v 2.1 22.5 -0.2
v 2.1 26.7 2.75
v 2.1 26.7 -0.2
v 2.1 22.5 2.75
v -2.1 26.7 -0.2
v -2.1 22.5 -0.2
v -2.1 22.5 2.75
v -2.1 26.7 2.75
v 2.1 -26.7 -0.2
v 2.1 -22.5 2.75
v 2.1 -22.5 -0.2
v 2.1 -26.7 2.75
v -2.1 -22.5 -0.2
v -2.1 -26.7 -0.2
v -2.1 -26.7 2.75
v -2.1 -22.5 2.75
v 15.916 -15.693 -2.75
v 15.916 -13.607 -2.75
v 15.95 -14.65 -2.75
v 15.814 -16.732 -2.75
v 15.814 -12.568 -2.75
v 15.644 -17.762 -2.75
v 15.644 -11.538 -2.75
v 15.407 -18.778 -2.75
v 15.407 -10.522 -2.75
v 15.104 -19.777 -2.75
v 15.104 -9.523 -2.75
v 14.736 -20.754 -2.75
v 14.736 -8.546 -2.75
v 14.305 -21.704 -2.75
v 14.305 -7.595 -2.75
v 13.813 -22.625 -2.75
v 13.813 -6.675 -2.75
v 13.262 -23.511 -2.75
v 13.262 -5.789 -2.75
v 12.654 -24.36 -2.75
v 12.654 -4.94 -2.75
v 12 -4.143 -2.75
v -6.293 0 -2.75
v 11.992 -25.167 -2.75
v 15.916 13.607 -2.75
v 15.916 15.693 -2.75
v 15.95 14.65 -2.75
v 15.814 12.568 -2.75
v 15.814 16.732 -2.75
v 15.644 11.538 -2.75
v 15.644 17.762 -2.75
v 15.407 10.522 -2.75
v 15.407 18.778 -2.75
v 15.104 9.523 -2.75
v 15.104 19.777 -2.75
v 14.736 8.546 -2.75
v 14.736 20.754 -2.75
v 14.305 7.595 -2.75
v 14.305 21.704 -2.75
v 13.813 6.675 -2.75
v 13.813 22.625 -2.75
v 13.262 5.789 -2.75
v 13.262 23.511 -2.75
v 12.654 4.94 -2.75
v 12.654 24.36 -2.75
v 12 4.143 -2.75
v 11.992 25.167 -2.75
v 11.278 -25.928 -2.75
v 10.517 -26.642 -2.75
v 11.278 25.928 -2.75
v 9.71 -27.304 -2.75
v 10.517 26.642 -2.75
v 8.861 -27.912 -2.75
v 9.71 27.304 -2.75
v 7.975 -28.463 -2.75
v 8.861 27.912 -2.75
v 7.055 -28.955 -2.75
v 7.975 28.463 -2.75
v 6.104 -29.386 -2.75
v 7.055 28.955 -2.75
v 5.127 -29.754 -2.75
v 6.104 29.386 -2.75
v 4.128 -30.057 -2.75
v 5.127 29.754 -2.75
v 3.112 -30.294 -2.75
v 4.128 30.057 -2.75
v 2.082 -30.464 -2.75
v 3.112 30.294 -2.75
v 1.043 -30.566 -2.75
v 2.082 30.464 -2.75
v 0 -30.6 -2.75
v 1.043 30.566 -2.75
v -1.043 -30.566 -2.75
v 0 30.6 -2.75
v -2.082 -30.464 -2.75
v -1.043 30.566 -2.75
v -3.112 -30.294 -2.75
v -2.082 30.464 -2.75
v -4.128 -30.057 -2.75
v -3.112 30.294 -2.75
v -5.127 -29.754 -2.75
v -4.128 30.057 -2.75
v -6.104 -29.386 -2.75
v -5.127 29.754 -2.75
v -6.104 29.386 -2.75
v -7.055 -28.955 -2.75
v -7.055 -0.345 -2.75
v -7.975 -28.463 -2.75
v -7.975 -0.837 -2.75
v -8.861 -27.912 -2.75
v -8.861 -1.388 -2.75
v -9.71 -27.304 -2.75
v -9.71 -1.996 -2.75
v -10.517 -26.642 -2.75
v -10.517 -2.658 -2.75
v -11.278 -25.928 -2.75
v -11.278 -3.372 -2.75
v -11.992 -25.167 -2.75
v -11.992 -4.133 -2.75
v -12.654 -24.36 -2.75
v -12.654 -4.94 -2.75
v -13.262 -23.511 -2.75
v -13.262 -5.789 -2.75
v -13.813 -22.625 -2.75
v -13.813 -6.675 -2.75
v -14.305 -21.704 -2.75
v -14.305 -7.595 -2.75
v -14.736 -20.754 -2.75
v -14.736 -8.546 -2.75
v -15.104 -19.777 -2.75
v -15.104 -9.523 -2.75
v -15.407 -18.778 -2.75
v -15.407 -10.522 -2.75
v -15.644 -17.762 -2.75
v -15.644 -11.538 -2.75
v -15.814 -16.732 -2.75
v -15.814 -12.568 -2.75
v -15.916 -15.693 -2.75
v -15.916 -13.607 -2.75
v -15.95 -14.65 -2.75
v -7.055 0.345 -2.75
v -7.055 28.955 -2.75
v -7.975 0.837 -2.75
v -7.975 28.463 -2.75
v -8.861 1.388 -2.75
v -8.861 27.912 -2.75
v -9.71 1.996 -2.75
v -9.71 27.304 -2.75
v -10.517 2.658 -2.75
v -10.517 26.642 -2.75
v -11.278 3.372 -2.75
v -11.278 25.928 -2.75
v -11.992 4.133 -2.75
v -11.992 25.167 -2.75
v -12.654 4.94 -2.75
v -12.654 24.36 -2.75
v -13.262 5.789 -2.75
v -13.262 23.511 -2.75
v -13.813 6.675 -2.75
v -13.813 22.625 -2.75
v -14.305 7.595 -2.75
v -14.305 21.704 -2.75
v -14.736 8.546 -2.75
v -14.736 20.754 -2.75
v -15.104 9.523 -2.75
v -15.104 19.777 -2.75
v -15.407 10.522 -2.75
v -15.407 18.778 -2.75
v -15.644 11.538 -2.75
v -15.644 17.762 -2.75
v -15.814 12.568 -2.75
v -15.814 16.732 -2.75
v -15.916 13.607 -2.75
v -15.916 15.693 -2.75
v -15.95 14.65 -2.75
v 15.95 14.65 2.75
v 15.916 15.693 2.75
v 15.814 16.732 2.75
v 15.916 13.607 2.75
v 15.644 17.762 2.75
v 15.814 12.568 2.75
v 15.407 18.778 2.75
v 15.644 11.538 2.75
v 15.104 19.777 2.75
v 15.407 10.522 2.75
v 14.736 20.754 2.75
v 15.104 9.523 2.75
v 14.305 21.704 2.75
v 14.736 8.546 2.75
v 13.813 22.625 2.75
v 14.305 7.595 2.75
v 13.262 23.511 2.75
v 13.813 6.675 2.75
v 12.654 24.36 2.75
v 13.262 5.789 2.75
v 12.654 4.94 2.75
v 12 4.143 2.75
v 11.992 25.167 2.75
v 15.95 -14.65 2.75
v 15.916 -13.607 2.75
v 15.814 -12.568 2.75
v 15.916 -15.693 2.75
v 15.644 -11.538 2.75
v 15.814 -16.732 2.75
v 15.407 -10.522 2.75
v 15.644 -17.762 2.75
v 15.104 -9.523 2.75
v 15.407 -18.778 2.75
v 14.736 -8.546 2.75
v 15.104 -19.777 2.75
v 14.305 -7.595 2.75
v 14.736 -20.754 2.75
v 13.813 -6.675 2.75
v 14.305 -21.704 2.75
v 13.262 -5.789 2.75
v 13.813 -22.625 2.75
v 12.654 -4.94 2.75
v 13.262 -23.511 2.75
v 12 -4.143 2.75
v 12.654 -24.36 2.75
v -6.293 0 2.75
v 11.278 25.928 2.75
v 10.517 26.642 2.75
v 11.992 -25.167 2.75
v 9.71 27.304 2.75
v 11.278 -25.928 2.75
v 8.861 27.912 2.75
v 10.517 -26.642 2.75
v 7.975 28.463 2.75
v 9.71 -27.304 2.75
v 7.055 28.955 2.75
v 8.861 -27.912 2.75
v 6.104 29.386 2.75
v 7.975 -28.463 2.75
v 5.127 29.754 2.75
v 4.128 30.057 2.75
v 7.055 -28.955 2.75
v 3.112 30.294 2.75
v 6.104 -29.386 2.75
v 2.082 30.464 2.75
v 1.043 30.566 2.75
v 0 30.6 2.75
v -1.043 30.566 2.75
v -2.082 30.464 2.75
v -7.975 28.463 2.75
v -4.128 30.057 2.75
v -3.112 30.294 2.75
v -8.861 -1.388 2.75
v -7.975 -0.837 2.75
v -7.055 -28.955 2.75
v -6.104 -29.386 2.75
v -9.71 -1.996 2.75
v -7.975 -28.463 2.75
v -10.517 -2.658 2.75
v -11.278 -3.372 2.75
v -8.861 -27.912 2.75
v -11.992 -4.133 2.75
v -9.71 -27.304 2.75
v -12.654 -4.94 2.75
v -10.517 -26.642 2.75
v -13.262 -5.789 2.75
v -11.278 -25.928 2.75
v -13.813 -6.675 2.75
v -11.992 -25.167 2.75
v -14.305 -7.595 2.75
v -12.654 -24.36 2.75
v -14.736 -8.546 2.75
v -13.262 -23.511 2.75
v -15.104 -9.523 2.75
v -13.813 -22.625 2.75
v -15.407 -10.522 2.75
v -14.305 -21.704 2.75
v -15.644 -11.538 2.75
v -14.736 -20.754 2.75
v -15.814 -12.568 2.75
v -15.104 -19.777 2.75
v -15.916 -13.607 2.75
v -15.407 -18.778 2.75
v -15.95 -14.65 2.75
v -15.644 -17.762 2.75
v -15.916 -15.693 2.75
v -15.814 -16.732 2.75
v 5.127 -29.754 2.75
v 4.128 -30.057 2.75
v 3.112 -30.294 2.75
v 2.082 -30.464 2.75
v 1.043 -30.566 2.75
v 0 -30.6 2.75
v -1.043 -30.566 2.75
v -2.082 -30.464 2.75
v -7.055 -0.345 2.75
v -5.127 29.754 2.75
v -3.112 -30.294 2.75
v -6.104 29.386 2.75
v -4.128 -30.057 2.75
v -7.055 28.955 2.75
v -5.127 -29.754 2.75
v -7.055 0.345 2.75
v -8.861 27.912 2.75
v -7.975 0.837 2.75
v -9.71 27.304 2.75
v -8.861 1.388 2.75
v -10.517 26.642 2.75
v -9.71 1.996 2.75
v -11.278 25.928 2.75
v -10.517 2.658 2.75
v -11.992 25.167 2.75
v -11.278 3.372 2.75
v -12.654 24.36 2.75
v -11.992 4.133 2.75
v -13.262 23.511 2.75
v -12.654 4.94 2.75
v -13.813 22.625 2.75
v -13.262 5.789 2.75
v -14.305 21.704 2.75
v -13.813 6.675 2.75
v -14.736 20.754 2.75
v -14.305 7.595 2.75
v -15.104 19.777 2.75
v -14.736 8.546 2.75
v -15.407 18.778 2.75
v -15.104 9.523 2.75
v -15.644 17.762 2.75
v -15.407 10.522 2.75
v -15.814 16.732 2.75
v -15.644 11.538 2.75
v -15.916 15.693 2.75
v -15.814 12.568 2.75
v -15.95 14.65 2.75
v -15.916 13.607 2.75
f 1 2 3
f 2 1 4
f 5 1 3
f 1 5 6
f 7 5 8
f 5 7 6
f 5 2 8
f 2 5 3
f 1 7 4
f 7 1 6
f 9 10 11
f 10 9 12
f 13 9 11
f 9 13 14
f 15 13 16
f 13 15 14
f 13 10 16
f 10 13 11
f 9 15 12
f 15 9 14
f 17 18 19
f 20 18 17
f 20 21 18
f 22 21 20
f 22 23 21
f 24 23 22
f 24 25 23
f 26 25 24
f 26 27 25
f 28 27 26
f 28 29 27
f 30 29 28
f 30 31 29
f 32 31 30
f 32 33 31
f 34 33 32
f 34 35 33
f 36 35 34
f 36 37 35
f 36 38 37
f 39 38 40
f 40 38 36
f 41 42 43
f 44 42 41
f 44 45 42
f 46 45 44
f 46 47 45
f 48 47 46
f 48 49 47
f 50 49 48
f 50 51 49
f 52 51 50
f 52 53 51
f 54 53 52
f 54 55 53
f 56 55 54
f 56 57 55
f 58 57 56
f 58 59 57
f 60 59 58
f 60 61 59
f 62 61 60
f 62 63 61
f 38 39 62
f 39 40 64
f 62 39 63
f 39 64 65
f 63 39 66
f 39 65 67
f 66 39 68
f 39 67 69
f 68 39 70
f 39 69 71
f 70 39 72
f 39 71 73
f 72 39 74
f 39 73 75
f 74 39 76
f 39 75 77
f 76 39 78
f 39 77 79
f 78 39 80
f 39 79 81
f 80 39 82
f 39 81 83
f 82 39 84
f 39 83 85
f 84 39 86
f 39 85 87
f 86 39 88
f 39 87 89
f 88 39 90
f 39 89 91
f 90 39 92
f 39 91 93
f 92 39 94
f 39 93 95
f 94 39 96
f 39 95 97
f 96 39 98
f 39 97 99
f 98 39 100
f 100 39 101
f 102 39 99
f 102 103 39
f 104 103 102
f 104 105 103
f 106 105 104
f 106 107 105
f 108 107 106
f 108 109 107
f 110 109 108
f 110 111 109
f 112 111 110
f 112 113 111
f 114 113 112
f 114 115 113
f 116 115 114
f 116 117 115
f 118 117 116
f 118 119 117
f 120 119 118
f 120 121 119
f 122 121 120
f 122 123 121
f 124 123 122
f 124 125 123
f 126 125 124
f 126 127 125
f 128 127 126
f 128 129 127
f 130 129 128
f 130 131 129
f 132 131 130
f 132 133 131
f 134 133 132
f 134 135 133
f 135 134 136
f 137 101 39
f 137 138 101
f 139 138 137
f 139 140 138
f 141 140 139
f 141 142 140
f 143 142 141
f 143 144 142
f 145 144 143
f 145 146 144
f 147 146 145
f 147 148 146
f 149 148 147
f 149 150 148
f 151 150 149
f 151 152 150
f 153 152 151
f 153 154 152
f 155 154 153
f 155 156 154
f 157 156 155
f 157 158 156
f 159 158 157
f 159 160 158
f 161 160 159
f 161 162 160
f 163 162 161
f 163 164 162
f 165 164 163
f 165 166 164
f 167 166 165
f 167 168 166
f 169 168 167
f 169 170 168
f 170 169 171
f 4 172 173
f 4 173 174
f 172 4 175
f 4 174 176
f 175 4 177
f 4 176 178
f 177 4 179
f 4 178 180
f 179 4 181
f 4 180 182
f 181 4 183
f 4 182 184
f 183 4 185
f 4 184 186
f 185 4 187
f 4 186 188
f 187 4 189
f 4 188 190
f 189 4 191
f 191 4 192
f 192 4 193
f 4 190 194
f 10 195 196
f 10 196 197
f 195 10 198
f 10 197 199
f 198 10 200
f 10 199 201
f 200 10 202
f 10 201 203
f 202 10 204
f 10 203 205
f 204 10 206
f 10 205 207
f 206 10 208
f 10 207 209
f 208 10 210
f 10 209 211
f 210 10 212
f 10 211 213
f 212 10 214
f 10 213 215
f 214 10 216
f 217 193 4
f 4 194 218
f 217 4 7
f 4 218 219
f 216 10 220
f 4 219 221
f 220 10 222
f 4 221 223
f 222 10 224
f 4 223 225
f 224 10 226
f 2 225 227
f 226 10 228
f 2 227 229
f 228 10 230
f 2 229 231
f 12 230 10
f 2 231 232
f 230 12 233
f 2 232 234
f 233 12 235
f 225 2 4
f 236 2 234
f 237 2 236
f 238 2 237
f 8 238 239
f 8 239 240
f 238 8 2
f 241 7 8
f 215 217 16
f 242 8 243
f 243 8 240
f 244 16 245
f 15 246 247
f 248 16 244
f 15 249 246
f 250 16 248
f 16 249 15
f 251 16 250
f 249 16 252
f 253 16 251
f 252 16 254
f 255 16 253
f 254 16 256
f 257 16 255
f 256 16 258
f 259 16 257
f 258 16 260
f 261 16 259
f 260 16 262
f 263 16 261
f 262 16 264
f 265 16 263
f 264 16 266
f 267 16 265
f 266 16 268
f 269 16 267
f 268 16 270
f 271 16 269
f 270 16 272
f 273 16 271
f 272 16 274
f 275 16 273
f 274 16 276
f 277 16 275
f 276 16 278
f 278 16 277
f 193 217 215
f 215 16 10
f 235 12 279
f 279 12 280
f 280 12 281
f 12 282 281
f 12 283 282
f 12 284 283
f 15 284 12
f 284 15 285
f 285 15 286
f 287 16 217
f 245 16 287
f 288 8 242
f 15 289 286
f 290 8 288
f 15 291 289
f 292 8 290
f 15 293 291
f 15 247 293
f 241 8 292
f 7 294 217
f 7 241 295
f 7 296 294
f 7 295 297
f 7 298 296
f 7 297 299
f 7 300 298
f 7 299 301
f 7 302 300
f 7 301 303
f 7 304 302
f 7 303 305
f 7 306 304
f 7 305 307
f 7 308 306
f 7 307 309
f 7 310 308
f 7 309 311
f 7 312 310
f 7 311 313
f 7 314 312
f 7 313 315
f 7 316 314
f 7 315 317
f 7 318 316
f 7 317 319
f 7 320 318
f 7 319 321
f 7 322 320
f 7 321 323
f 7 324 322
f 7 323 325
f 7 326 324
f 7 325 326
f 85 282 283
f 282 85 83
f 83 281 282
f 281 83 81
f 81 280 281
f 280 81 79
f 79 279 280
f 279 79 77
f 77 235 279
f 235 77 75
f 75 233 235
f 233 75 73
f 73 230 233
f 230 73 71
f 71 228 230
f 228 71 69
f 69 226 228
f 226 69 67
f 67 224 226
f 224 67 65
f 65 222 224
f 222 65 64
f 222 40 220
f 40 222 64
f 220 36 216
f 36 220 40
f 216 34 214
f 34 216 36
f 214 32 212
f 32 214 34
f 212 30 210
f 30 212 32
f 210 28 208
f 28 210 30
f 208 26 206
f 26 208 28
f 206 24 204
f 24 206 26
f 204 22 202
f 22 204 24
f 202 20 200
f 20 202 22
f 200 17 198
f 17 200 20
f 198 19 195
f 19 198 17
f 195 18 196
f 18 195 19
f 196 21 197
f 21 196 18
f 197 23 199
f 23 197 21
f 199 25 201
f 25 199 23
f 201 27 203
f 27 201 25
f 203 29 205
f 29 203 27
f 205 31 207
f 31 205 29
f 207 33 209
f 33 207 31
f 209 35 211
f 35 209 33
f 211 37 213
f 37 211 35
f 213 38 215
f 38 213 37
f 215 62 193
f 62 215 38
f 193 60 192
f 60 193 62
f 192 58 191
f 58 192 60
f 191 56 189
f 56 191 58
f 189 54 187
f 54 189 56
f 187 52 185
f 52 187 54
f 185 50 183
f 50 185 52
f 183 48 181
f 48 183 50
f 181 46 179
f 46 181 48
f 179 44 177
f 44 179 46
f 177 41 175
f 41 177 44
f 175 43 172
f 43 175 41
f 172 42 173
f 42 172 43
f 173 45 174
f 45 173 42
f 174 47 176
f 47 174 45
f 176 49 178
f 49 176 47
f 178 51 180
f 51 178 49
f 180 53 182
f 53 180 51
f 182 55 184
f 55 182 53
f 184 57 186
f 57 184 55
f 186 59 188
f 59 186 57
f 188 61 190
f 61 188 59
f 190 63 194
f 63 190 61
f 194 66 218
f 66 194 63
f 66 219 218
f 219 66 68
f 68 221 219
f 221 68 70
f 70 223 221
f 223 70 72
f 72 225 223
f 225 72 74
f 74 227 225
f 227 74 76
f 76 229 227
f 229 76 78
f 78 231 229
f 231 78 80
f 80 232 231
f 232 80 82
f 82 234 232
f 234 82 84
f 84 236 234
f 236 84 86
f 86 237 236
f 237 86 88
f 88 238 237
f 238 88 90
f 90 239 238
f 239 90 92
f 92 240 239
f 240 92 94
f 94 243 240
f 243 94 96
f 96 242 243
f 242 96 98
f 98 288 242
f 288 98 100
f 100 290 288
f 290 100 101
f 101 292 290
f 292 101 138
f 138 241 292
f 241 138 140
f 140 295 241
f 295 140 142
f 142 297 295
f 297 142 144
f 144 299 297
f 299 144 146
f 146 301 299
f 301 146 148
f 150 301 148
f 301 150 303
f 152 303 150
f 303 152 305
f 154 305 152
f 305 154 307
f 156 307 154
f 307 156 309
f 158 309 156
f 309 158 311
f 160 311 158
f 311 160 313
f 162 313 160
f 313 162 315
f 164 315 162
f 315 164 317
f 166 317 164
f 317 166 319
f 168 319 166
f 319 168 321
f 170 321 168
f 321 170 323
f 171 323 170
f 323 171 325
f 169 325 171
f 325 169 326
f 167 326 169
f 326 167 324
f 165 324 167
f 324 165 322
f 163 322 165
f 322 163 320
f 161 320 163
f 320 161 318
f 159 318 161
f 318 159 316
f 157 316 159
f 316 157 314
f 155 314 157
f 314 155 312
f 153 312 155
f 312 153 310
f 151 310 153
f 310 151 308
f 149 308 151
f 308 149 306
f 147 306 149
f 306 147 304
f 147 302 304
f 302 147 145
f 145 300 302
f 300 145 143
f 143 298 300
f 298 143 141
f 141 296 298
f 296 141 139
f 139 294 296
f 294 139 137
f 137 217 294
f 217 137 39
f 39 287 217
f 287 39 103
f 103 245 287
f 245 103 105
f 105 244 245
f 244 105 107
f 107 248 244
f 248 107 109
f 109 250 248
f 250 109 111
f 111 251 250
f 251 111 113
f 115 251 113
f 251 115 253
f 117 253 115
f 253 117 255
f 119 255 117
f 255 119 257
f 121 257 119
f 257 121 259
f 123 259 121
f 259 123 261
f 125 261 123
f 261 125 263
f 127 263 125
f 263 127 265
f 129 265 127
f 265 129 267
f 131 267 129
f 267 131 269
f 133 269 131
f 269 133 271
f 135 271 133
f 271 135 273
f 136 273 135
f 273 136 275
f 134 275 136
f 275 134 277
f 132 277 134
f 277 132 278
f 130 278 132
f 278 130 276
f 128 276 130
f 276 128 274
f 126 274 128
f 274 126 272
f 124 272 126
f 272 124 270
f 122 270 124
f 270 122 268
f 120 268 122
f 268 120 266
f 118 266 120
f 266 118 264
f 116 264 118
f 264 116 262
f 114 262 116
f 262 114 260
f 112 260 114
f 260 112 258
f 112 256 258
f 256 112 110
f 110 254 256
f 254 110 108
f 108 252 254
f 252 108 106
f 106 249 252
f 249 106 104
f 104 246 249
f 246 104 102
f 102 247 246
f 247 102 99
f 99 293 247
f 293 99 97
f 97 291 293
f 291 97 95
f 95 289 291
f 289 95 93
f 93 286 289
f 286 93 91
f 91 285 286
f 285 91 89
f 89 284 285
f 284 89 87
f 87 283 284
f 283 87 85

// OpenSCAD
$fn=96;

L = 61.2;
W = 31.9;
T = 5.5;

tab_r = W/2;                 // 15.95
tab_center_offset = L/2 - tab_r; // 14.65

web_w = 16.0;
web_len = 30.0;
web_offset_x = 4.0;

hole_size = 4.2;
hole_depth = T + 0.4;
hole_tip_inset = 6.0;
hole_y = tab_center_offset + tab_r - hole_tip_inset;

recess_depth = 1.2;
recess_w = 12.0;
recess_h = 8.0;
recess_y_offset = 2.0;

module capsule2d(len, r){
    hull(){
        translate([0, -len/2 + r]) circle(r=r);
        translate([0,  len/2 - r]) circle(r=r);
    }
}

module tab2d(){
    capsule2d(2*tab_r, tab_r);
}

module web2d(){
    translate([web_offset_x, 0]) square([web_w, web_len], center=true);
}

module plate2d(){
    union(){
        translate([0,  tab_center_offset]) tab2d();
        translate([0, -tab_center_offset]) tab2d();
        web2d();
    }
}

module recess_cut(){
    union(){
        translate([web_offset_x,  tab_center_offset - tab_r + recess_y_offset, T - recess_depth/2])
            cube([recess_w, recess_h, recess_depth], center=true);
        translate([web_offset_x, -tab_center_offset + tab_r - recess_y_offset, T - recess_depth/2])
            cube([recess_w, recess_h, recess_depth], center=true);
    }
}

module holes_cut(){
    union(){
        translate([0,  hole_y, T/2]) cube([hole_size, hole_size, hole_depth], center=true);
        translate([0, -hole_y, T/2]) cube([hole_size, hole_size, hole_depth], center=true);
    }
}

difference(){
    linear_extrude(height=T, center=true) plate2d();
    holes_cut();
    recess_cut();
}
